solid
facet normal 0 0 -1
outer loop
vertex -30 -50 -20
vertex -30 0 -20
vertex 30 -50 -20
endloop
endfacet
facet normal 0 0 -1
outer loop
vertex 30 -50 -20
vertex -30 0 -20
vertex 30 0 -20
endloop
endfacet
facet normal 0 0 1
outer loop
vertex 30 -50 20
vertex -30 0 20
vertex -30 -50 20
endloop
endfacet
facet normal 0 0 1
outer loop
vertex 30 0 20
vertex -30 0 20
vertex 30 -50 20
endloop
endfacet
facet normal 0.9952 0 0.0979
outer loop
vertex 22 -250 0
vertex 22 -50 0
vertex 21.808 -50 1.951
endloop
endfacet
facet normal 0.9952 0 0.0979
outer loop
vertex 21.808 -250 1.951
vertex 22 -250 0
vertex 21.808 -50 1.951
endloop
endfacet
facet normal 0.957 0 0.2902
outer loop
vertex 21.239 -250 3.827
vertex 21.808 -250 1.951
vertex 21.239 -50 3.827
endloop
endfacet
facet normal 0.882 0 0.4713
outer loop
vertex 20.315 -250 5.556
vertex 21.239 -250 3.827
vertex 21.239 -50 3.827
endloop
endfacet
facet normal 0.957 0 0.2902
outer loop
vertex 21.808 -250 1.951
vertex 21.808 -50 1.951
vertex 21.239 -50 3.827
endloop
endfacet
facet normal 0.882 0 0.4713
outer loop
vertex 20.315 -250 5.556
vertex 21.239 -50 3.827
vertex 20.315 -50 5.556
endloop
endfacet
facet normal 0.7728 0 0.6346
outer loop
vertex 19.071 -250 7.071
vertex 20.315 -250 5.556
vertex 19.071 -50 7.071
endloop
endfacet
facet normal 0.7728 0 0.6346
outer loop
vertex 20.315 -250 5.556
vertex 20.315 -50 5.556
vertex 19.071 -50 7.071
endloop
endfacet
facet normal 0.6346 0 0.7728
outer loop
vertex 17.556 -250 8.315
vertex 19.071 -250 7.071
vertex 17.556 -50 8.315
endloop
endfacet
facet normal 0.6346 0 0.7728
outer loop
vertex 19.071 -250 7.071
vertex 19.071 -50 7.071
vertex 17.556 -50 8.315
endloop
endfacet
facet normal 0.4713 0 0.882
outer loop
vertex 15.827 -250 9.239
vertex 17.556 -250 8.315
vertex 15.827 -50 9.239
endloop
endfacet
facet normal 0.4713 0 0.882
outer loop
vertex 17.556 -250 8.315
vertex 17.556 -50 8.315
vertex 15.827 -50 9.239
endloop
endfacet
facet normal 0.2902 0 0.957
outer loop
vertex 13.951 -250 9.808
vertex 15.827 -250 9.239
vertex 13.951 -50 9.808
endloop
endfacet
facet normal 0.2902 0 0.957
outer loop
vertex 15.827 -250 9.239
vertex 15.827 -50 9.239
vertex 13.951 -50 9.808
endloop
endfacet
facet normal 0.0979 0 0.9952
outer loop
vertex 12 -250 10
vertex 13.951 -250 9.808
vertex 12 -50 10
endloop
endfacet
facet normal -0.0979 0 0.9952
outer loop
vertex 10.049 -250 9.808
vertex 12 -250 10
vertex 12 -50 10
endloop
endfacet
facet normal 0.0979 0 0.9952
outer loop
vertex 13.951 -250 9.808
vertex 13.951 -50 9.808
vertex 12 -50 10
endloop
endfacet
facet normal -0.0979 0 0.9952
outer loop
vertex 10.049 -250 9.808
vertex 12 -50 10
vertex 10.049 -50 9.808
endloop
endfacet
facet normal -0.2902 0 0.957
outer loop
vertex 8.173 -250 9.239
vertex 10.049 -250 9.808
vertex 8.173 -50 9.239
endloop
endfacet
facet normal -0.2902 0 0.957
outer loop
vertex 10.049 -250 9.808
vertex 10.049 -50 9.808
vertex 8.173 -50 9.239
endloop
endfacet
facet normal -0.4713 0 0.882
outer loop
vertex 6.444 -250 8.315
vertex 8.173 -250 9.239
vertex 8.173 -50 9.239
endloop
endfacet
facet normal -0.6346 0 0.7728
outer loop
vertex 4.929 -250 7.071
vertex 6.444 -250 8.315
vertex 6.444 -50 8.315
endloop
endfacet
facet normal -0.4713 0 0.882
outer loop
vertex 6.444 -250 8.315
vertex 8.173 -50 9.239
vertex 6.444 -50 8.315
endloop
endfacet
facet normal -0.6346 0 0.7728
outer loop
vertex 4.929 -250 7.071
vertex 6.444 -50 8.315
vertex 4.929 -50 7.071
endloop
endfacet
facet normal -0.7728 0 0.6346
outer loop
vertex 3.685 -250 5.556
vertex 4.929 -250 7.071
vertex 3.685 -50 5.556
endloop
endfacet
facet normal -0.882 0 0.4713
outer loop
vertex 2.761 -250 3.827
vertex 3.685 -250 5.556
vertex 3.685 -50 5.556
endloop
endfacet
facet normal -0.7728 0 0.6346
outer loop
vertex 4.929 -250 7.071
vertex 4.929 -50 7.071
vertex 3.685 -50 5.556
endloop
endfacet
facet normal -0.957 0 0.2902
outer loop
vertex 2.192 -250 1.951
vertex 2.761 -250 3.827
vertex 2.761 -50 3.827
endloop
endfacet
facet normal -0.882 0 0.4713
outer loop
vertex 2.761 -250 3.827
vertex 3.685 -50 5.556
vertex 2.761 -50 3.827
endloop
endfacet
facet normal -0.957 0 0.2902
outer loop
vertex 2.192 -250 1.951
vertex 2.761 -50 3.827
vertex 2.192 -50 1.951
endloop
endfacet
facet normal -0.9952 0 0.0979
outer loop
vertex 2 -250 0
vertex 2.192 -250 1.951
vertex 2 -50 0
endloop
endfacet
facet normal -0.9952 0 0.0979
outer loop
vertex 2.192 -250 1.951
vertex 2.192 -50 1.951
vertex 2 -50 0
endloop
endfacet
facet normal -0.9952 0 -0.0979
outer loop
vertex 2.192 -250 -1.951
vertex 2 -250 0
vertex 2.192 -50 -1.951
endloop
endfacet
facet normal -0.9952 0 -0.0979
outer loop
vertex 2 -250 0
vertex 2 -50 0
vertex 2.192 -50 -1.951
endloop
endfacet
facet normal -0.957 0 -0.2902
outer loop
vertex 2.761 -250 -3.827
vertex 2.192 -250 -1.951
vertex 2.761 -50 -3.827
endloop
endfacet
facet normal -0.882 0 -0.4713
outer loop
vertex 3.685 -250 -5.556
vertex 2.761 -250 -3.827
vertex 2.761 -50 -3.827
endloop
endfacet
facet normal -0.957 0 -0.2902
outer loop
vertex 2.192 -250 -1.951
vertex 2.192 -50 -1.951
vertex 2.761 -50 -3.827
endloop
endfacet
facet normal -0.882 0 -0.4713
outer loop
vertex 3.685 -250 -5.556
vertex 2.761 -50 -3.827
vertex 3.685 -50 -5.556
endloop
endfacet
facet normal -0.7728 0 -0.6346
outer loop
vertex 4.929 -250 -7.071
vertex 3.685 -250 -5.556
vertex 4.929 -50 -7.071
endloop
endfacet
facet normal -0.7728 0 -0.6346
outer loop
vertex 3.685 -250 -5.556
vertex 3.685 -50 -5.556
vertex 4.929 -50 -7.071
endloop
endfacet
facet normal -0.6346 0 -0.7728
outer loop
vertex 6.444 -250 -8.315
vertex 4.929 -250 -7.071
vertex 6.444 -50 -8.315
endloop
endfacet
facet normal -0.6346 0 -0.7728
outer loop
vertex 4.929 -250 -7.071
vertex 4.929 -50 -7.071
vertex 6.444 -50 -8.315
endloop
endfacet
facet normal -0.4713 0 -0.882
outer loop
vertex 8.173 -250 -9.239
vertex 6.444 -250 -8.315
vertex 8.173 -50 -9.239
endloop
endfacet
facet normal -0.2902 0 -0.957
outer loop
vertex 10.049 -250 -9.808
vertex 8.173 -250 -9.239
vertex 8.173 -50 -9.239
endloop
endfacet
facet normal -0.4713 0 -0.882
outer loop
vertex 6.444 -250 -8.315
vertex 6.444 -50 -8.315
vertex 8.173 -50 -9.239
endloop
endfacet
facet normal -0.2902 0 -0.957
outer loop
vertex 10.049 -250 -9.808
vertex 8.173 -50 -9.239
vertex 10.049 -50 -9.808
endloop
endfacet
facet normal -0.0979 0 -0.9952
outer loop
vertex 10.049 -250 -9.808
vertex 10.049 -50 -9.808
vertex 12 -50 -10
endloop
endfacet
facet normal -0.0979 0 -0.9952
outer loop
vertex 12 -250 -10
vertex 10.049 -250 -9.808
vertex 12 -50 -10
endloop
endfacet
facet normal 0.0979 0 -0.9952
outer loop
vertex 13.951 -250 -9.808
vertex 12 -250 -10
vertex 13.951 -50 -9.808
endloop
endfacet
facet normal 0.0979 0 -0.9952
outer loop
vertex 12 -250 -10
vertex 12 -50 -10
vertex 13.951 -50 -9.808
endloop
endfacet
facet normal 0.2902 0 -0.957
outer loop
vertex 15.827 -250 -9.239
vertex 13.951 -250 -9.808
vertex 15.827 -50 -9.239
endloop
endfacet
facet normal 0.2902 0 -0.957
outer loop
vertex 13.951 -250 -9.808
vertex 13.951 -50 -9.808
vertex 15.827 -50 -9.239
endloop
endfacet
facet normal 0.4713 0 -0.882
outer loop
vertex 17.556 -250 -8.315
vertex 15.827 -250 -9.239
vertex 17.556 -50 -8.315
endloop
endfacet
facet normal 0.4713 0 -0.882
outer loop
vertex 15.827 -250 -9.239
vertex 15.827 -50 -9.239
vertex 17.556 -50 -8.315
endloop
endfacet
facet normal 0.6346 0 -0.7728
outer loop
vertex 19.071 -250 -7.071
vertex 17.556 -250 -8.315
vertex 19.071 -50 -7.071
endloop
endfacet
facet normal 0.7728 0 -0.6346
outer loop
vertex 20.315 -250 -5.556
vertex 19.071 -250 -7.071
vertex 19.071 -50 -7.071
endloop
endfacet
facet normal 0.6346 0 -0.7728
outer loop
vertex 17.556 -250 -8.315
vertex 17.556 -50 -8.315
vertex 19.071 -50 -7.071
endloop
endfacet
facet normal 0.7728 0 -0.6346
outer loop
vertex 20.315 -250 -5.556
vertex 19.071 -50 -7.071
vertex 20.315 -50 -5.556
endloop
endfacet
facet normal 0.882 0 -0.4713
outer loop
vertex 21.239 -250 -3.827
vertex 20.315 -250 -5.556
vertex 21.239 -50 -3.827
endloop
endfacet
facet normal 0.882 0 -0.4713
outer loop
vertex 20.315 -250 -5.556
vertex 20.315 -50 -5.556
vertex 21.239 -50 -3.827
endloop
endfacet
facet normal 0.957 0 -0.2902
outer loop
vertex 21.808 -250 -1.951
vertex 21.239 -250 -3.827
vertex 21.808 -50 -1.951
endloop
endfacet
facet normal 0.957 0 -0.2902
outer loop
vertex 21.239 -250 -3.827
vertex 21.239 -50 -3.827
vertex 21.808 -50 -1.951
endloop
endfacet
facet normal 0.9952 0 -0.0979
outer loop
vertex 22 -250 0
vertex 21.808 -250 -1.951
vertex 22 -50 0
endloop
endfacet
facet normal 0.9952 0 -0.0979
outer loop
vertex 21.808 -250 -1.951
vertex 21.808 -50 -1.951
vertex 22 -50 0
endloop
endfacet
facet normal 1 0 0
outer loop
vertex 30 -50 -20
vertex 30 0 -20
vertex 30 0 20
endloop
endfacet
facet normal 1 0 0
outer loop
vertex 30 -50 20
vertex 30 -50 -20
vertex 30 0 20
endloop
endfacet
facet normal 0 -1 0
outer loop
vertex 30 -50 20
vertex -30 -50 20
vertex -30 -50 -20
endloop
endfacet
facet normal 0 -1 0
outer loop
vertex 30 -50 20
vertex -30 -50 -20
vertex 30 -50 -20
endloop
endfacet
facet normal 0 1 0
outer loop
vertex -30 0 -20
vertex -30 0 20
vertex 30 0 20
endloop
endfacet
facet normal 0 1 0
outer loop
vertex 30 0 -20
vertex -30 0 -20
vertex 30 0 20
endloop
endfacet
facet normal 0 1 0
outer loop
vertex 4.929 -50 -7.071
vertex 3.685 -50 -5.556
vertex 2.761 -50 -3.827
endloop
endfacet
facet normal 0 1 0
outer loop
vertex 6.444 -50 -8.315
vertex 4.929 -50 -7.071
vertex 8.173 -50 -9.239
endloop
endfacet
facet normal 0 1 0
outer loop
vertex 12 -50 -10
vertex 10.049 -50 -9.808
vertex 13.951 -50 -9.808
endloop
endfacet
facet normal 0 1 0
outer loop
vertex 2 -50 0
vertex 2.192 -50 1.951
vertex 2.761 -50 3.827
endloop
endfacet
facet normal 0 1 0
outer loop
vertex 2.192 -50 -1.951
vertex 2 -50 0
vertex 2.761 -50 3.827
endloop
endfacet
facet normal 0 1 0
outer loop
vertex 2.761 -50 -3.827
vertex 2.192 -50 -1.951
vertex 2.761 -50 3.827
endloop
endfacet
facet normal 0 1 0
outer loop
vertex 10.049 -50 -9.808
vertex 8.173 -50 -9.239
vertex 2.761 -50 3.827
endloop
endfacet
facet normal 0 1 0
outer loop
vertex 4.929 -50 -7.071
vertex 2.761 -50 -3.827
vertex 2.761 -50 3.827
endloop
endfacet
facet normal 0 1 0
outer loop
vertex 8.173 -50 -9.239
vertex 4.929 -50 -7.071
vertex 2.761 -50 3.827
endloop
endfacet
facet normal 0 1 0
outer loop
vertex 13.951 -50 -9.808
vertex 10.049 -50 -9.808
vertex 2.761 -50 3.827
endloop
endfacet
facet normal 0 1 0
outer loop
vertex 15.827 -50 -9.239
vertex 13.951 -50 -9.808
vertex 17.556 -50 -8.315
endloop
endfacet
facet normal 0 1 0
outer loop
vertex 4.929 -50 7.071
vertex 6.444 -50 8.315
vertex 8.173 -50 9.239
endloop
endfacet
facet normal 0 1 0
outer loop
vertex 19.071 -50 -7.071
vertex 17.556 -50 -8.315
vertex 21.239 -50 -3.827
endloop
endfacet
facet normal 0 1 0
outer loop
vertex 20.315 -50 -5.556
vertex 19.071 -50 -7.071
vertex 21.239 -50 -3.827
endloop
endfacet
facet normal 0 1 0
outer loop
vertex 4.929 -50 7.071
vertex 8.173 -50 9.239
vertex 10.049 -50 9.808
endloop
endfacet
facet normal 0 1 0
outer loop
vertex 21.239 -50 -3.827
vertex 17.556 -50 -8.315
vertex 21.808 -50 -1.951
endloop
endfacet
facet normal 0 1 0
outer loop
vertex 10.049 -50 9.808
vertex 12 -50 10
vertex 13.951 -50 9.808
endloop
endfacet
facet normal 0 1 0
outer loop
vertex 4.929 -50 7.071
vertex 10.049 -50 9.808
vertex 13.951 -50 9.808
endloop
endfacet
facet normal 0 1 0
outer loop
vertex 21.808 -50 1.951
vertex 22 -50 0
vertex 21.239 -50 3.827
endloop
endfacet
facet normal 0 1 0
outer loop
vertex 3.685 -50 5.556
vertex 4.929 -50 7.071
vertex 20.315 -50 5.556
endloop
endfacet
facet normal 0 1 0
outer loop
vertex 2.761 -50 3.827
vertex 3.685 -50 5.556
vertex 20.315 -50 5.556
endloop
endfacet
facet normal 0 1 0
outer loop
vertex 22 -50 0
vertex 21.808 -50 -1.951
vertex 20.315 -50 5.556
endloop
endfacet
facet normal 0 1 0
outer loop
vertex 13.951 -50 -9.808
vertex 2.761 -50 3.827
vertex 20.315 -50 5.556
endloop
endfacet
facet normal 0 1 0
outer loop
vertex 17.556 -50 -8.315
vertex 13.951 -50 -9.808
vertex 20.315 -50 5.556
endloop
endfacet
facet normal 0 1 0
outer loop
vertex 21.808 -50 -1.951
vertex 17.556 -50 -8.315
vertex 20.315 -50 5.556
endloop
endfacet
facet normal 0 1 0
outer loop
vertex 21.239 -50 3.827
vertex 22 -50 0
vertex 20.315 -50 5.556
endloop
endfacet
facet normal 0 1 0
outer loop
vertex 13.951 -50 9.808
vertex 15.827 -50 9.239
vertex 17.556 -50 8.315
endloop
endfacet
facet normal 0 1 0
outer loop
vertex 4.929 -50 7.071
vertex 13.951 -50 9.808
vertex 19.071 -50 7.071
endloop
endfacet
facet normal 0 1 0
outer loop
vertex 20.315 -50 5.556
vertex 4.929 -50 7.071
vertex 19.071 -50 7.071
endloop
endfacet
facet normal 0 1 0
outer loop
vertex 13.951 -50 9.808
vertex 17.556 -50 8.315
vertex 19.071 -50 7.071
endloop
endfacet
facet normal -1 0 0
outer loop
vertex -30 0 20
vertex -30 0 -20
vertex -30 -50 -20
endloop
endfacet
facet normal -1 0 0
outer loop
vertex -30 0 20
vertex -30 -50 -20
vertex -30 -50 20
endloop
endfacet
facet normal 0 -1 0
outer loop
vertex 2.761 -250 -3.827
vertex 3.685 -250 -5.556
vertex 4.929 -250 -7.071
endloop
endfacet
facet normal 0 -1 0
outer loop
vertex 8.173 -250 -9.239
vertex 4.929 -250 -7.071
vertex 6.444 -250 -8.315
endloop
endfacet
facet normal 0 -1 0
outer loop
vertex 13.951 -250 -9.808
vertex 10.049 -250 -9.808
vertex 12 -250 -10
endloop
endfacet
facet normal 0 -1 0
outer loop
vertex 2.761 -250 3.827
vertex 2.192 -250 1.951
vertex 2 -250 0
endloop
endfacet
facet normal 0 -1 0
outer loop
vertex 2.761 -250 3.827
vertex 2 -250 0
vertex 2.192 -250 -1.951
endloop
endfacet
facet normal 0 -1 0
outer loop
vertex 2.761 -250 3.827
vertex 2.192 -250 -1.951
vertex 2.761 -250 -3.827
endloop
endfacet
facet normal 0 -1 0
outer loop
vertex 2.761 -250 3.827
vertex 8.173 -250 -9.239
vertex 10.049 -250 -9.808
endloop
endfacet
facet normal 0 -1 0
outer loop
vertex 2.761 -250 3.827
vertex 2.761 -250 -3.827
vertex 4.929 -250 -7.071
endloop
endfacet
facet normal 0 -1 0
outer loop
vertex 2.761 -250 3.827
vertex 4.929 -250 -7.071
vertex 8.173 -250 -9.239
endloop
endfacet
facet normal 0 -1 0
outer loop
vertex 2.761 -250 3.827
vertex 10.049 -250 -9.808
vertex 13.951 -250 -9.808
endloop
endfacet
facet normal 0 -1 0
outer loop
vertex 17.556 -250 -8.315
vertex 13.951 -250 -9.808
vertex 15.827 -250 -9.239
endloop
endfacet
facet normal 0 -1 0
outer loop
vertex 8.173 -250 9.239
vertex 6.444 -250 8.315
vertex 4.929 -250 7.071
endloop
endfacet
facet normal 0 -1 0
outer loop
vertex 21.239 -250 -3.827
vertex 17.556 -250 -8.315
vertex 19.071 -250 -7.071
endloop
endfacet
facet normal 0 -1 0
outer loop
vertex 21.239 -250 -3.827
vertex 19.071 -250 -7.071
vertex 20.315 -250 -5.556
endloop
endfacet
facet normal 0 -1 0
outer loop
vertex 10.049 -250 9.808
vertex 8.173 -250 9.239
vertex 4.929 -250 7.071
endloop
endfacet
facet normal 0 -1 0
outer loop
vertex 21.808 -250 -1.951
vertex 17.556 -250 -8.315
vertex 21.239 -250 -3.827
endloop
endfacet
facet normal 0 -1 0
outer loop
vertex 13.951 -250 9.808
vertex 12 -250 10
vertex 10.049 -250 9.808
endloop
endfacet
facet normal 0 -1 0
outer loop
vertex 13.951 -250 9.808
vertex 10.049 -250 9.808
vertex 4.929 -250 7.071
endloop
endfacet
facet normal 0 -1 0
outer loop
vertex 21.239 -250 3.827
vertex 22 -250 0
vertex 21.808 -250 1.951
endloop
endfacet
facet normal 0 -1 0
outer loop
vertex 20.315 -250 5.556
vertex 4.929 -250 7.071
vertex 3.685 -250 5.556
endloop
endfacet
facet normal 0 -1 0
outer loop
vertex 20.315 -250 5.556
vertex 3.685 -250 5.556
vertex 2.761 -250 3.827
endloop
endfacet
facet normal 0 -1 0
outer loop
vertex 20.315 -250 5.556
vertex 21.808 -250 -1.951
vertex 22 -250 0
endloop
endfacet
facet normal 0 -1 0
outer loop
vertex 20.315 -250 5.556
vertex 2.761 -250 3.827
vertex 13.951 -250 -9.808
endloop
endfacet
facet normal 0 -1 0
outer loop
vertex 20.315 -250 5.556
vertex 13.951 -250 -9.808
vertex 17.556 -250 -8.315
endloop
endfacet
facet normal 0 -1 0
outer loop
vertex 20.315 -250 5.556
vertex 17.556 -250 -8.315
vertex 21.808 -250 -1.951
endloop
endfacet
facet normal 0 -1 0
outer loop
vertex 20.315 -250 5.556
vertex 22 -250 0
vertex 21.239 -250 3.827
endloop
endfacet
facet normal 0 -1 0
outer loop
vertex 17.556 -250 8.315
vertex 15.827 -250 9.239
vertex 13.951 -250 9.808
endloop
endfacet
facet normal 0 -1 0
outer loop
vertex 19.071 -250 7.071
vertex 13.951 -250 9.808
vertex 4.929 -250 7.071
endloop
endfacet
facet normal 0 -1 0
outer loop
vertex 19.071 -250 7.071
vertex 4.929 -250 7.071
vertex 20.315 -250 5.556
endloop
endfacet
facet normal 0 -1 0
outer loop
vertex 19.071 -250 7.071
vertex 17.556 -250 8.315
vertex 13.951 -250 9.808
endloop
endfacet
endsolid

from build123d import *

# Parameters (mm, degrees)
F0_W     = 60
F0_H     = 40
F1_DEPTH = 50
F2_R     = 10
F3_DEPTH = 200


with BuildPart() as f1:
    # F0 (on Front) → F1 (new body)
    with BuildSketch(Plane.XZ):
        Rectangle(F0_W, F0_H)
    extrude(amount=F1_DEPTH)


with BuildPart() as f3:
    # F2 (on face) → F3 (new body)
    with BuildSketch(Plane.XZ.offset(50)):
        with Locations((12, 0)):
            Circle(F2_R)
    extrude(amount=F3_DEPTH)


solid = Compound([f1.part, f3.part])
